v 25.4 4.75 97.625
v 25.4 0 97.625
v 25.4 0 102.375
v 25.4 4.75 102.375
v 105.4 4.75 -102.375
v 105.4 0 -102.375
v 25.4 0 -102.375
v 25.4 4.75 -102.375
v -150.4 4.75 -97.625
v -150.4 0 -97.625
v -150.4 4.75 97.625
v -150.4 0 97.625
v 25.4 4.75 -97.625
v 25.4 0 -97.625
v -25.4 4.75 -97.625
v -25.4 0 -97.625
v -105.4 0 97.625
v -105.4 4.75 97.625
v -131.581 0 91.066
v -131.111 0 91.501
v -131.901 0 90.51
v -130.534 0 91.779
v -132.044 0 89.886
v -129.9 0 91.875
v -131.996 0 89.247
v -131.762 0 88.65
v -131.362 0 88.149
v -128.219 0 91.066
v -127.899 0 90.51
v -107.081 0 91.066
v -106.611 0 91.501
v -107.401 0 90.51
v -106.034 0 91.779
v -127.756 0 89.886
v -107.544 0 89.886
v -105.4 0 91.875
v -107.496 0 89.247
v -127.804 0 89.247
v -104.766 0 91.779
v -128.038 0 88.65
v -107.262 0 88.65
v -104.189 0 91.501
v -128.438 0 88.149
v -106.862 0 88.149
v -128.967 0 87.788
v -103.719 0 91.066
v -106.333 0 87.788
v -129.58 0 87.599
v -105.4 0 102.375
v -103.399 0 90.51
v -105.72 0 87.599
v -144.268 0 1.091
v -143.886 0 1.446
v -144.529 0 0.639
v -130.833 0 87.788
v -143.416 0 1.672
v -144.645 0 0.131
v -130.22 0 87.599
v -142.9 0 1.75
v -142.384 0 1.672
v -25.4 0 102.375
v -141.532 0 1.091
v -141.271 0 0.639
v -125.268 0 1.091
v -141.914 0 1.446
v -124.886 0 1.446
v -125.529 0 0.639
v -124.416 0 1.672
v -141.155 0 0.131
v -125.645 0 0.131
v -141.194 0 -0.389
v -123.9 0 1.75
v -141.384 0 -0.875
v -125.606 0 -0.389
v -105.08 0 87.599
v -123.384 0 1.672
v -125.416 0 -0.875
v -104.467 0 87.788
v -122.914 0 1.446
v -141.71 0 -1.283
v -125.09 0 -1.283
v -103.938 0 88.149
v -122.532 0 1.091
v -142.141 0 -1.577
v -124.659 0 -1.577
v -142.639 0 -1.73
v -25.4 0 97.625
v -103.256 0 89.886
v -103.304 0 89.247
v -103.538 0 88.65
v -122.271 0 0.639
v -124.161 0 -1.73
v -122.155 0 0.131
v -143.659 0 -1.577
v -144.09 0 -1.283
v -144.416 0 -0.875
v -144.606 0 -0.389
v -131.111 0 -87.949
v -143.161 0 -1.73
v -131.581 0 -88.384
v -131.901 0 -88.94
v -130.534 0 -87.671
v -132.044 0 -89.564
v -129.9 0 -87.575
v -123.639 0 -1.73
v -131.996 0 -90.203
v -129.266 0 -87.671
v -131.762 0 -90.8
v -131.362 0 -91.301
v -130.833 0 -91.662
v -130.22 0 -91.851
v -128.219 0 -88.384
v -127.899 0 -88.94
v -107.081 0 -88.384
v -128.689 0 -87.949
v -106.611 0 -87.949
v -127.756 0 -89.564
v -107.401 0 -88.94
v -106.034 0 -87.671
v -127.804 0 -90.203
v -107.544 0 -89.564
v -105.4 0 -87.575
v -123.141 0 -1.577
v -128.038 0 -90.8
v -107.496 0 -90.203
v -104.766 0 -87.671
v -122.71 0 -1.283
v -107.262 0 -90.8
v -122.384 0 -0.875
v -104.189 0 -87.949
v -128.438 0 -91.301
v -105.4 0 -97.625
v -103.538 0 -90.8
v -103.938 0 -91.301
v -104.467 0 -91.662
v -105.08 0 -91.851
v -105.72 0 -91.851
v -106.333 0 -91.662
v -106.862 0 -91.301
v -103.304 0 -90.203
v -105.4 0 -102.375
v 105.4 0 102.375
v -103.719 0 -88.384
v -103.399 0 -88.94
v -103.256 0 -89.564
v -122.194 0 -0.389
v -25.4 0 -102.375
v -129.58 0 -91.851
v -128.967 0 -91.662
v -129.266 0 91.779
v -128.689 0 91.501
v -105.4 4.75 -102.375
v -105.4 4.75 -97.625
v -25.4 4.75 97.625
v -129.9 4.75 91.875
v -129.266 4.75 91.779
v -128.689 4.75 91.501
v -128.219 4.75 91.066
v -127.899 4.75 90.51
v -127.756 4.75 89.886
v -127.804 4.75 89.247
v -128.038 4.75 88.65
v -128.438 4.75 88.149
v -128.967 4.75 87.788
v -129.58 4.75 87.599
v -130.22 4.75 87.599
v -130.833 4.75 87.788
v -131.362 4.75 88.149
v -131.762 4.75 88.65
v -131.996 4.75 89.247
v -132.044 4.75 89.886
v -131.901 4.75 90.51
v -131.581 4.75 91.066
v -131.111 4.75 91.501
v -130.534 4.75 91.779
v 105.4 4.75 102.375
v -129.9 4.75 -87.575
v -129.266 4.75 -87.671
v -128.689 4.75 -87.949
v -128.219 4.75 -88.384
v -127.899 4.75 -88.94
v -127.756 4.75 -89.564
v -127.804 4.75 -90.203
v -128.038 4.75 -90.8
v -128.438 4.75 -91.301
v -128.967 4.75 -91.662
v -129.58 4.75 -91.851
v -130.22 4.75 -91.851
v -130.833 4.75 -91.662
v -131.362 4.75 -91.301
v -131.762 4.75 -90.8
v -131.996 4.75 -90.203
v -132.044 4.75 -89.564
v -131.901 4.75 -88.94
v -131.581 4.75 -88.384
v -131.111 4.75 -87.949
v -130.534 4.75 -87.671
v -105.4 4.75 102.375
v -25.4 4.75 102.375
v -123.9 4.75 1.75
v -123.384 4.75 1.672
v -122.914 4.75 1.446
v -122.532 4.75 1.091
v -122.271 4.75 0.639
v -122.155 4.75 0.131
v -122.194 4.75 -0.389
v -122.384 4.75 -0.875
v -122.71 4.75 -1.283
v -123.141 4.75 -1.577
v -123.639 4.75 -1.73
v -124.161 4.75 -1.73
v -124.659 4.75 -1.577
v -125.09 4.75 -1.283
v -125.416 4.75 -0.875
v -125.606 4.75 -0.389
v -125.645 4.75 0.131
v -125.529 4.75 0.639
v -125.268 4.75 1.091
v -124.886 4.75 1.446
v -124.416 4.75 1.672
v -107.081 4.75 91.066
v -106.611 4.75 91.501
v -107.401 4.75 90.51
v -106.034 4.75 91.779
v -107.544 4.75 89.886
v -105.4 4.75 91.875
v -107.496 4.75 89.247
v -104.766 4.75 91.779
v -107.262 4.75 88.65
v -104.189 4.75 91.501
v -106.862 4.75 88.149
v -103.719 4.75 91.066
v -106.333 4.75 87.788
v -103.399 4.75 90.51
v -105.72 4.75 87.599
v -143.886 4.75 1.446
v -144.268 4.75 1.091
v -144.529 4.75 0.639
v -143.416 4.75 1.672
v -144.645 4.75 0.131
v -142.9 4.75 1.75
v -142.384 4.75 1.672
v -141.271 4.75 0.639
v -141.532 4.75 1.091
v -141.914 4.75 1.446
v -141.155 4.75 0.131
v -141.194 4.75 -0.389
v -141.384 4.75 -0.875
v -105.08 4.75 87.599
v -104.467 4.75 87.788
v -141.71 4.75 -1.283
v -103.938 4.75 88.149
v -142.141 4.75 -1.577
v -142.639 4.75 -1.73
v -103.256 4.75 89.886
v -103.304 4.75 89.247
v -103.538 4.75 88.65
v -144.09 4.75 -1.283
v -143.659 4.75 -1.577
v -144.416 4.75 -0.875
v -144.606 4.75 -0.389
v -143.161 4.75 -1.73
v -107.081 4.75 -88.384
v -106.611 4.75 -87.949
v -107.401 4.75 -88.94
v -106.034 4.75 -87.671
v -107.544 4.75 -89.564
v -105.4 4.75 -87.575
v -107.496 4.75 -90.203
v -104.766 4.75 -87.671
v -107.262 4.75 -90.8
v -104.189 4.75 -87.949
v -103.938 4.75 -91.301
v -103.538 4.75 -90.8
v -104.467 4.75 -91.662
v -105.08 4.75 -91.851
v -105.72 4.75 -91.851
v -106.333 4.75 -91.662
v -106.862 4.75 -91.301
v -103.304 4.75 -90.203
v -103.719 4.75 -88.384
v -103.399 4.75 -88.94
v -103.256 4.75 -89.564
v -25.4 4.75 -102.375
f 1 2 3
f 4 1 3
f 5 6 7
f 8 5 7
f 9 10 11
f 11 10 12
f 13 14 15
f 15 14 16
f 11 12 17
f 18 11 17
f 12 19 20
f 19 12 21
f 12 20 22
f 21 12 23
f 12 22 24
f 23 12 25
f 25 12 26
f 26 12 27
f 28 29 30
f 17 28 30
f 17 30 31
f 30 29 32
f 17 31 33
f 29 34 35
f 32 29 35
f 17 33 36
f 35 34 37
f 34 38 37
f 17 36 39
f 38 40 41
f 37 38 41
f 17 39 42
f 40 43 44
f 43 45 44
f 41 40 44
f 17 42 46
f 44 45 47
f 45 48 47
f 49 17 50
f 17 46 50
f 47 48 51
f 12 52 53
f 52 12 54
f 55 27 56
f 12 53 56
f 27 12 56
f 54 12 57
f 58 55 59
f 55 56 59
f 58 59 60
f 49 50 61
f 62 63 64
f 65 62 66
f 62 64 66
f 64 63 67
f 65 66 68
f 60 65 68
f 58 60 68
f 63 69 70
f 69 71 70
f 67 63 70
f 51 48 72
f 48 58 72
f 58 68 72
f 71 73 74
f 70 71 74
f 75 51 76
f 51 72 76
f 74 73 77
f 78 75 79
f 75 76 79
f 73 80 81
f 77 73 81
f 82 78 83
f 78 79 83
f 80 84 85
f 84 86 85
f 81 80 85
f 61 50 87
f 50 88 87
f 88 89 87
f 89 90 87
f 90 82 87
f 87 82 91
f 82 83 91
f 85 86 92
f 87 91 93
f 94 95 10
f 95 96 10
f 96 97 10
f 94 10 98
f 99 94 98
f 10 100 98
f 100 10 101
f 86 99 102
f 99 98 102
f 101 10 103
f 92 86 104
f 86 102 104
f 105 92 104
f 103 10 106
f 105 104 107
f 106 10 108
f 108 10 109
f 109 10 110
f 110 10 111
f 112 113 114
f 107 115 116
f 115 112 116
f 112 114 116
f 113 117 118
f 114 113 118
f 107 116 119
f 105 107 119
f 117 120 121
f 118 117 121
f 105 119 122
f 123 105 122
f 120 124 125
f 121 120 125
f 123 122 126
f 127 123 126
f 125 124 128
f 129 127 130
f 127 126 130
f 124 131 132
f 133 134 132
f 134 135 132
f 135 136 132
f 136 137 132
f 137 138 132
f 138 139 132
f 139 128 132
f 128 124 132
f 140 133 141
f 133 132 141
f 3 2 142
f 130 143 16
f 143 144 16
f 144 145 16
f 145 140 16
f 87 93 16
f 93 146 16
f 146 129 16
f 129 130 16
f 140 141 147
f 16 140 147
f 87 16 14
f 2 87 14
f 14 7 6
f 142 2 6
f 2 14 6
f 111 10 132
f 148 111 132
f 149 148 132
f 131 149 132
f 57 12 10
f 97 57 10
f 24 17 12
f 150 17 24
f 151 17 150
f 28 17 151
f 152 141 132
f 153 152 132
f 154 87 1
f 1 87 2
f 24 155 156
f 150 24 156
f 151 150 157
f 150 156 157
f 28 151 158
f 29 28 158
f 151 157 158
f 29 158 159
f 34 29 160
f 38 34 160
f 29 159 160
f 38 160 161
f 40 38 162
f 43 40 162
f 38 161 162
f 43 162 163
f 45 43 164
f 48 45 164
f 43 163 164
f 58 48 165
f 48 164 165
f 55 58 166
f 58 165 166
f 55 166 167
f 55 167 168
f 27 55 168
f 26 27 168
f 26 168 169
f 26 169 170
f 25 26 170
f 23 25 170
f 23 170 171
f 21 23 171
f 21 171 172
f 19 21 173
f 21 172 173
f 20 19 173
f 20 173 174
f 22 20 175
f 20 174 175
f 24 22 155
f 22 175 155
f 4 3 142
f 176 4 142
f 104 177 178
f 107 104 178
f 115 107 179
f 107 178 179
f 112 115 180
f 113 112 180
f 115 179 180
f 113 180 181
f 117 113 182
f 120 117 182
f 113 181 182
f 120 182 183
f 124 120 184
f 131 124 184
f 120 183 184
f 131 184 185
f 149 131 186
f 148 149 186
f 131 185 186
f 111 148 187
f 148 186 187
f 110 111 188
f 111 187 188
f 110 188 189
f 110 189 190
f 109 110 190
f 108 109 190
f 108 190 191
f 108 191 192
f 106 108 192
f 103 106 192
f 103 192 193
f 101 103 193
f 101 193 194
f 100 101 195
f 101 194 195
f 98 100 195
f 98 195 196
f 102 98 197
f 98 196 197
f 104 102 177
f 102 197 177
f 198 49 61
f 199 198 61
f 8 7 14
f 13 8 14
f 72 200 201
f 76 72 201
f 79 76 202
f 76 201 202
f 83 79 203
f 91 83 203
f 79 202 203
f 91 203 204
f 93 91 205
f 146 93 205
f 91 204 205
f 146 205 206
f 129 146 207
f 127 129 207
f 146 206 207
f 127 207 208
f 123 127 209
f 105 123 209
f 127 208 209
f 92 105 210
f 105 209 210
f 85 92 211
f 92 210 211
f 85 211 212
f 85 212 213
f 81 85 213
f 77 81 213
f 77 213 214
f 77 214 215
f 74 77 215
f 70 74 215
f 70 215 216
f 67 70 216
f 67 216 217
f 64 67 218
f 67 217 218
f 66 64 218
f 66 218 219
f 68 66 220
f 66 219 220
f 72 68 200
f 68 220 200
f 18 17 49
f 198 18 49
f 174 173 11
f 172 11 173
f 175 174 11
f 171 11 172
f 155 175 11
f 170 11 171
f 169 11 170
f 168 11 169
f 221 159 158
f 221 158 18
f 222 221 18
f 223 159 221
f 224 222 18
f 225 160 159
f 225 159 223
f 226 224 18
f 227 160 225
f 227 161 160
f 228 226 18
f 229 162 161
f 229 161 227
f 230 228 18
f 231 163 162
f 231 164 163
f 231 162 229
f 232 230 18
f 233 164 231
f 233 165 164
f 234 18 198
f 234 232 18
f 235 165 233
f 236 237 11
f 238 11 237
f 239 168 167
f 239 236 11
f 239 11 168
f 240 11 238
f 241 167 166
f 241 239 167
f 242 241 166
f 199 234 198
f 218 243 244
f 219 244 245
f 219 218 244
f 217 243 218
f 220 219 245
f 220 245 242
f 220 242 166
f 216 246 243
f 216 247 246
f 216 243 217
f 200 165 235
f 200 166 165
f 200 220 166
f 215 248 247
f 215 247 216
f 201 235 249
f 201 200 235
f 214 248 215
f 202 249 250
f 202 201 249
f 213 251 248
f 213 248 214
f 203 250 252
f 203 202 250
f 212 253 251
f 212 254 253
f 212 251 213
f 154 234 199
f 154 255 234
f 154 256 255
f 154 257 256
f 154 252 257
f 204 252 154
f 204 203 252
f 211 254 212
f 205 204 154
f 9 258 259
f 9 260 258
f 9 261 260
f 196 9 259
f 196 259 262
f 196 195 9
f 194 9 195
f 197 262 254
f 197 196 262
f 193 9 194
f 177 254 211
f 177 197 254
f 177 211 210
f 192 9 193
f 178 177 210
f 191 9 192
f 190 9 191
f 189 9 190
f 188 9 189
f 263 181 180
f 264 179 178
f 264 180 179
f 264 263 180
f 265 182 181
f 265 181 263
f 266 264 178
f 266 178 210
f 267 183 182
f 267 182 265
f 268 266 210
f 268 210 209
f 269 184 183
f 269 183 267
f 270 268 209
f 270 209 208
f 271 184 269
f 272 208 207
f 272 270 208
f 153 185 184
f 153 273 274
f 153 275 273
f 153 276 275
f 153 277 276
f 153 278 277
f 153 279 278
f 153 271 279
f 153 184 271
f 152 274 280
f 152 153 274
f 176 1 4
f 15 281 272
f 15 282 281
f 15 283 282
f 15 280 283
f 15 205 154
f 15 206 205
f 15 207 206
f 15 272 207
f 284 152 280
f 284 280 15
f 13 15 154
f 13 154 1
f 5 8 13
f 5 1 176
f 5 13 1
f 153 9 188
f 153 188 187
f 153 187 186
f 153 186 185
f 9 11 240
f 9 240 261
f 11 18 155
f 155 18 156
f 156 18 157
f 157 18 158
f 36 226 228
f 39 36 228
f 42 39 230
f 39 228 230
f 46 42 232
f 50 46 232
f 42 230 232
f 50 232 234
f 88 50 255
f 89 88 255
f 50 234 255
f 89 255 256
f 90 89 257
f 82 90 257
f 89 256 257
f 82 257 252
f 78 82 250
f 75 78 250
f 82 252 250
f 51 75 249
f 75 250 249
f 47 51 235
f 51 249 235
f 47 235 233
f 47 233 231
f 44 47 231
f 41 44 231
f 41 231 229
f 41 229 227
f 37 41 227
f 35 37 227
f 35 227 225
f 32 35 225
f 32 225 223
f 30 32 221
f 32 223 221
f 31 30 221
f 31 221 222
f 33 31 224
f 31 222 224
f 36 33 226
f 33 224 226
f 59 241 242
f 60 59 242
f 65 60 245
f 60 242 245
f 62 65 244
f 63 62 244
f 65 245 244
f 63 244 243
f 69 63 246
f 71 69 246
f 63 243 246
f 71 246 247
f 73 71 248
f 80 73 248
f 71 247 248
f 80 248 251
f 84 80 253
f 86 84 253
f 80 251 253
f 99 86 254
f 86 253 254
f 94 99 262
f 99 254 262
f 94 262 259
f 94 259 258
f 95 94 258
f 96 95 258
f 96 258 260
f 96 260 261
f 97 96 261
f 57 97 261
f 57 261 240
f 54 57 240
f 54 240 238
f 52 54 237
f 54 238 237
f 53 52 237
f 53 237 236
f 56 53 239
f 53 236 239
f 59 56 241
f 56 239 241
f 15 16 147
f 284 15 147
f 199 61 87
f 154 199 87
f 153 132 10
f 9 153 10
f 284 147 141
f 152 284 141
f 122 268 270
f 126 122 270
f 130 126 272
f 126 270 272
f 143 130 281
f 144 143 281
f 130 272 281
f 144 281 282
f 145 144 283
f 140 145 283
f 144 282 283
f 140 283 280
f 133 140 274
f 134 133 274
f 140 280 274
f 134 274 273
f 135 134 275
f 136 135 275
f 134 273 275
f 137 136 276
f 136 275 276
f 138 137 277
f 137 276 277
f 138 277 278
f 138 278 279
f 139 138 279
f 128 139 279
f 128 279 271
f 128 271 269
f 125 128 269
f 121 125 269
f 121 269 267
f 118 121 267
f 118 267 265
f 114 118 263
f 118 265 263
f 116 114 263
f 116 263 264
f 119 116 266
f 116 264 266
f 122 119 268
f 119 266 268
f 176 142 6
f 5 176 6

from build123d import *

# Parameters (mm, degrees)
EXTRUDE_1_DEPTH     = 4.75
SKETCH_3_R          = 1.75
CUT_EXTRUDE_1_DEPTH = 4.75
SKETCH_4_R          = 2.15
CUT_EXTRUDE_2_DEPTH = 4.75


with BuildPart() as part:
    # 草圖1 → 填料-伸長1 (new body)
    with BuildSketch(Plane(origin=(0, 0, 0), x_dir=(1, 0, 0), z_dir=(0, 1, 0))):
        Polygon((-105.4, 97.625), (-150.4, 97.625), (-150.4, -97.625), (-105.4, -97.625), (-105.4, -102.375), (-25.4, -102.375), (-25.4, -97.625), (25.4, -97.625), (25.4, -102.375), (105.4, -102.375), (105.4, -97.625), (105.4, 97.625), (105.4, 102.375), (25.4, 102.375), (25.4, 97.625), (-25.4, 97.625), (-25.4, 102.375), (-105.4, 102.375), align=None)
    extrude(amount=EXTRUDE_1_DEPTH)

    # 草圖3 → 除料-伸長1 (cut)
    with BuildSketch(Plane(origin=(0, 4.75, 0), x_dir=(1, 0, 0), z_dir=(0, 1, 0))):
        with Locations(Location((-123.9, 0, 0), (0, 0, 270))):
            Circle(SKETCH_3_R)
        with Locations(Location((-142.9, 0, 0), (0, 0, 270))):
            Circle(SKETCH_3_R)
    extrude(amount=-CUT_EXTRUDE_1_DEPTH, mode=Mode.SUBTRACT)

    # 草圖4 → 除料-伸長2 (cut)
    with BuildSketch(Plane(origin=(0, 4.75, 0), x_dir=(1, 0, 0), z_dir=(0, 1, 0))):
        with Locations(Location((-105.4, -89.725, 0), (0, 0, 270))):
            Circle(SKETCH_4_R)
        with Locations(Location((-129.9, -89.725, 0), (0, 0, 270))):
            Circle(SKETCH_4_R)
        with Locations(Location((-105.4, 89.725, 0), (0, 0, 270))):
            Circle(SKETCH_4_R)
        with Locations(Location((-129.9, 89.725, 0), (0, 0, 270))):
            Circle(SKETCH_4_R)
    extrude(amount=-CUT_EXTRUDE_2_DEPTH, mode=Mode.SUBTRACT)


solid = part.part
